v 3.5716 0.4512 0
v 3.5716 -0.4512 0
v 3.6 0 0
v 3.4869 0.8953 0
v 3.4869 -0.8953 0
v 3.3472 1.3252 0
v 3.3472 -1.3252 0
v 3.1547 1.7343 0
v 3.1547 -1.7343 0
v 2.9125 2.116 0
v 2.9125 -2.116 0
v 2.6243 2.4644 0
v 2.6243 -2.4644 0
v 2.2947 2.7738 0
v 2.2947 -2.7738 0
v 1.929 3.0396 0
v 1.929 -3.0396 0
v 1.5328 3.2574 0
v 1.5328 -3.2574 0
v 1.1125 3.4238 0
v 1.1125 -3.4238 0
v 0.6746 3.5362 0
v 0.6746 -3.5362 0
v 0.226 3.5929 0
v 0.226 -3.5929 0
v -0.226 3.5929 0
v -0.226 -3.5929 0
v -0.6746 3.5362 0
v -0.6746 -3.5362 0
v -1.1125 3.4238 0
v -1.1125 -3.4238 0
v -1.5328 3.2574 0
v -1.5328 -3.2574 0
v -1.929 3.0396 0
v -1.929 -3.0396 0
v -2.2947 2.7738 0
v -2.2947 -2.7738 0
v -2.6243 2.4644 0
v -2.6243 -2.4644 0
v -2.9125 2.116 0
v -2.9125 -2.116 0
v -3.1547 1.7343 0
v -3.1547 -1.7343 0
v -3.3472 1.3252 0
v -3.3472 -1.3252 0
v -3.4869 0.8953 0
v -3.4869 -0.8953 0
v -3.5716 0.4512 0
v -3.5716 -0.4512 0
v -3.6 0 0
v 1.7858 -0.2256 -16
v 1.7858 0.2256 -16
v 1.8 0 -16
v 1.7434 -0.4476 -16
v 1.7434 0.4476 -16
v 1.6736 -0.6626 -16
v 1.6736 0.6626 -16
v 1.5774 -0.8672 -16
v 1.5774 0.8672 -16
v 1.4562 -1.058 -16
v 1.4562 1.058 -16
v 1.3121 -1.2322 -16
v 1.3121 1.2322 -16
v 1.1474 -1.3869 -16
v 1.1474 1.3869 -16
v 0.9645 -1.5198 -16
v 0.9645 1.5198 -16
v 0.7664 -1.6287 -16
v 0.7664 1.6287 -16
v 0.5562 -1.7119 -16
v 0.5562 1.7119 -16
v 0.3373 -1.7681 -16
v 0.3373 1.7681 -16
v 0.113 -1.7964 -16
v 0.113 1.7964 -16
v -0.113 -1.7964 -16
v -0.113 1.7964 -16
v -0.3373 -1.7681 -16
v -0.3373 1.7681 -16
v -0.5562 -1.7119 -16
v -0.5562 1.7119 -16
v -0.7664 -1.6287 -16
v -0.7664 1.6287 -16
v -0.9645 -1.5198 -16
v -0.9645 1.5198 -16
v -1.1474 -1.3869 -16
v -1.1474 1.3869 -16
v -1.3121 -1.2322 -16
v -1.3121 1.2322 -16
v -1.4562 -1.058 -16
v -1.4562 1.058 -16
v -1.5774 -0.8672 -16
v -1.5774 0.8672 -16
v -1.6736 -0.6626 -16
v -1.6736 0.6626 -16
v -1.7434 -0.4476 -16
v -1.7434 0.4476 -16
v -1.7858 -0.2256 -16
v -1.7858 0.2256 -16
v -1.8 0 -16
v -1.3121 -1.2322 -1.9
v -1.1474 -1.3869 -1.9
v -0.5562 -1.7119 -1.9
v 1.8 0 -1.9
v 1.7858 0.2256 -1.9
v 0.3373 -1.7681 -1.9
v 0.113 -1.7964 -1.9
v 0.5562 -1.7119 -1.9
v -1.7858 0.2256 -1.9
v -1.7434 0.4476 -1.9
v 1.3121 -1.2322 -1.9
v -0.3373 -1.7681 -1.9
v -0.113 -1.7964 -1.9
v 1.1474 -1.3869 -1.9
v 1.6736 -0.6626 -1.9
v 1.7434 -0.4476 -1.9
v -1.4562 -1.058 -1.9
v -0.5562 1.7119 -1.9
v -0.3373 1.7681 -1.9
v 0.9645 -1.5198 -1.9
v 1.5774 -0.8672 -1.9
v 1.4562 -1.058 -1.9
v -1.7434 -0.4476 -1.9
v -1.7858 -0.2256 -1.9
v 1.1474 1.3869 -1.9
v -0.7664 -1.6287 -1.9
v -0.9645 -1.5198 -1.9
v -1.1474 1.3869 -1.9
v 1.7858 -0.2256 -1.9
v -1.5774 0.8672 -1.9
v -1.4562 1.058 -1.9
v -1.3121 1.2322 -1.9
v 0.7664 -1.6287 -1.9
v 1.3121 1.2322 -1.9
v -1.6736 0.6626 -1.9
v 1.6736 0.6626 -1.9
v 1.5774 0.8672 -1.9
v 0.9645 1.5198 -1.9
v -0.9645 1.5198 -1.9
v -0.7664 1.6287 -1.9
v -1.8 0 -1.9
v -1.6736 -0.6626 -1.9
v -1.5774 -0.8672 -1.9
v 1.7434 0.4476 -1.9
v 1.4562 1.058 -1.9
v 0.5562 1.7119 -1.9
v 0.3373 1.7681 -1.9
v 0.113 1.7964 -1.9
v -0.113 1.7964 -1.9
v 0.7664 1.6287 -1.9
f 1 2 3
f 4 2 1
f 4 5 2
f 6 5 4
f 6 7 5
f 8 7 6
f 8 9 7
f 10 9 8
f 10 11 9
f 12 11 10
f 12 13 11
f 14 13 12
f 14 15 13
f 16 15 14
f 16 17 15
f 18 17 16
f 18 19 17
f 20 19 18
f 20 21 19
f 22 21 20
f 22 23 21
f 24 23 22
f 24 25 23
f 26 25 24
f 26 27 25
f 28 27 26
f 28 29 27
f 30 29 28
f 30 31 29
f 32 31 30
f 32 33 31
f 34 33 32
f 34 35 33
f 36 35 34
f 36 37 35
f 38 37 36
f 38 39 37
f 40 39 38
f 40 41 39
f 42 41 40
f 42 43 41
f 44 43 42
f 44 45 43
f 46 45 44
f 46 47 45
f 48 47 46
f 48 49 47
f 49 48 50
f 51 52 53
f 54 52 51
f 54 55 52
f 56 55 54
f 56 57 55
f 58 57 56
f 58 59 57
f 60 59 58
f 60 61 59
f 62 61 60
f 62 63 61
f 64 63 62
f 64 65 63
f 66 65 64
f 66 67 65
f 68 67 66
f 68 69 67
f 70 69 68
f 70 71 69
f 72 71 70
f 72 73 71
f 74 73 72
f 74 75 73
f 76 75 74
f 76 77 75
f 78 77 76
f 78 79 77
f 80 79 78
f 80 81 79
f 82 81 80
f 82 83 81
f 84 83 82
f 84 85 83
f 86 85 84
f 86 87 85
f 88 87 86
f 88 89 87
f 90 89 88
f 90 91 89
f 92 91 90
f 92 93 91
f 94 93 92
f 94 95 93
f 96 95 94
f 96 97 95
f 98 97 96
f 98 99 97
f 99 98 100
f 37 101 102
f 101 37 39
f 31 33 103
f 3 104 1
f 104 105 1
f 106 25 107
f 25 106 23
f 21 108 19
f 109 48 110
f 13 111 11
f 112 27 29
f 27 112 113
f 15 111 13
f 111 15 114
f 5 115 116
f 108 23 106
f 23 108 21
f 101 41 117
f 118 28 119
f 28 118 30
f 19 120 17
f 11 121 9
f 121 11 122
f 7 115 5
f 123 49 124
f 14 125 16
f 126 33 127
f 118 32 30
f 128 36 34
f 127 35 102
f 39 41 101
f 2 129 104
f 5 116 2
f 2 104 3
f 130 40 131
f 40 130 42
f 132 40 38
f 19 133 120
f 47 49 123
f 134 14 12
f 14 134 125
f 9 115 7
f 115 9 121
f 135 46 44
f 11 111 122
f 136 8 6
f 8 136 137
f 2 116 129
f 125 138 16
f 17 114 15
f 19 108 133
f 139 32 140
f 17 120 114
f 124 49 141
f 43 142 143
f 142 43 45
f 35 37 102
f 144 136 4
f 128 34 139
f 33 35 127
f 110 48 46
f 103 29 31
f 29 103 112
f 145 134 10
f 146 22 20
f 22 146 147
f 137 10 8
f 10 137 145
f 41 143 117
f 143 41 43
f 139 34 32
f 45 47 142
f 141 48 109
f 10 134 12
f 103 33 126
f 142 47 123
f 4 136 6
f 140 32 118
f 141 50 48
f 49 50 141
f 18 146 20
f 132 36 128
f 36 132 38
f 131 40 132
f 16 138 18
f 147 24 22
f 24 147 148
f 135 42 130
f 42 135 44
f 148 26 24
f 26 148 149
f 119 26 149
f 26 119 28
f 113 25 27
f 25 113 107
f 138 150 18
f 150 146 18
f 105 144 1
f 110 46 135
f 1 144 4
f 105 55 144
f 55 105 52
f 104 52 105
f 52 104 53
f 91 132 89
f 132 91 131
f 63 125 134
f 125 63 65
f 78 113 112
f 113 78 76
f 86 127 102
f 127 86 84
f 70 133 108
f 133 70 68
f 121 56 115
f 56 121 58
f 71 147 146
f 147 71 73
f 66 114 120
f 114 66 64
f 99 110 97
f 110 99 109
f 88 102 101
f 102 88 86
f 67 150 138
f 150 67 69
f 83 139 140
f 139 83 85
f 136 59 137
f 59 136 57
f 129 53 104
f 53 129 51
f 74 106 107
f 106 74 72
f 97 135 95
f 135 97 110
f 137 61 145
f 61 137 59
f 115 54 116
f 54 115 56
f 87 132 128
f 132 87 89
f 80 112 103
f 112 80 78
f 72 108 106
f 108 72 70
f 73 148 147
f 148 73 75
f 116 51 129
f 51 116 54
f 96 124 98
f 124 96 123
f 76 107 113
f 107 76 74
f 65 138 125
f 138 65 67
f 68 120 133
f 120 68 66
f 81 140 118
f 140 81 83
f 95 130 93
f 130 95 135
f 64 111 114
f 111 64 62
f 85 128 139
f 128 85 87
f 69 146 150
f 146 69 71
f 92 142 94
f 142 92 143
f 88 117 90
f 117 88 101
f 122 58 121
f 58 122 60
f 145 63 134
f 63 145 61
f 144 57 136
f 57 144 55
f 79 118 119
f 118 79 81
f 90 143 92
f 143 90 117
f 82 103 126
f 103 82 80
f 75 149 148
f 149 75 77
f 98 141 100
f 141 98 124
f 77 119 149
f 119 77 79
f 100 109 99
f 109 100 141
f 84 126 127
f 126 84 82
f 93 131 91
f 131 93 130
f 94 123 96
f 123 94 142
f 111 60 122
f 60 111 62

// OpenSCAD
$fn = 50;


difference() {
	union() {
		translate(v = [0, 0, 0]) {
			rotate(a = [0, 0, 0]) {
				difference() {
					union() {
						translate(v = [0, 0, -16.0000000000]) {
							cylinder(h = 16, r = 1.5000000000);
						}
						translate(v = [0, 0, -1.9000000000]) {
							cylinder(h = 1.9000000000, r1 = 1.8000000000, r2 = 3.6000000000);
						}
						translate(v = [0, 0, -16.0000000000]) {
							cylinder(h = 16, r = 1.8000000000);
						}
						translate(v = [0, 0, -16.0000000000]) {
							cylinder(h = 16, r = 1.5000000000);
						}
					}
					union();
				}
			}
		}
	}
	union();
}
